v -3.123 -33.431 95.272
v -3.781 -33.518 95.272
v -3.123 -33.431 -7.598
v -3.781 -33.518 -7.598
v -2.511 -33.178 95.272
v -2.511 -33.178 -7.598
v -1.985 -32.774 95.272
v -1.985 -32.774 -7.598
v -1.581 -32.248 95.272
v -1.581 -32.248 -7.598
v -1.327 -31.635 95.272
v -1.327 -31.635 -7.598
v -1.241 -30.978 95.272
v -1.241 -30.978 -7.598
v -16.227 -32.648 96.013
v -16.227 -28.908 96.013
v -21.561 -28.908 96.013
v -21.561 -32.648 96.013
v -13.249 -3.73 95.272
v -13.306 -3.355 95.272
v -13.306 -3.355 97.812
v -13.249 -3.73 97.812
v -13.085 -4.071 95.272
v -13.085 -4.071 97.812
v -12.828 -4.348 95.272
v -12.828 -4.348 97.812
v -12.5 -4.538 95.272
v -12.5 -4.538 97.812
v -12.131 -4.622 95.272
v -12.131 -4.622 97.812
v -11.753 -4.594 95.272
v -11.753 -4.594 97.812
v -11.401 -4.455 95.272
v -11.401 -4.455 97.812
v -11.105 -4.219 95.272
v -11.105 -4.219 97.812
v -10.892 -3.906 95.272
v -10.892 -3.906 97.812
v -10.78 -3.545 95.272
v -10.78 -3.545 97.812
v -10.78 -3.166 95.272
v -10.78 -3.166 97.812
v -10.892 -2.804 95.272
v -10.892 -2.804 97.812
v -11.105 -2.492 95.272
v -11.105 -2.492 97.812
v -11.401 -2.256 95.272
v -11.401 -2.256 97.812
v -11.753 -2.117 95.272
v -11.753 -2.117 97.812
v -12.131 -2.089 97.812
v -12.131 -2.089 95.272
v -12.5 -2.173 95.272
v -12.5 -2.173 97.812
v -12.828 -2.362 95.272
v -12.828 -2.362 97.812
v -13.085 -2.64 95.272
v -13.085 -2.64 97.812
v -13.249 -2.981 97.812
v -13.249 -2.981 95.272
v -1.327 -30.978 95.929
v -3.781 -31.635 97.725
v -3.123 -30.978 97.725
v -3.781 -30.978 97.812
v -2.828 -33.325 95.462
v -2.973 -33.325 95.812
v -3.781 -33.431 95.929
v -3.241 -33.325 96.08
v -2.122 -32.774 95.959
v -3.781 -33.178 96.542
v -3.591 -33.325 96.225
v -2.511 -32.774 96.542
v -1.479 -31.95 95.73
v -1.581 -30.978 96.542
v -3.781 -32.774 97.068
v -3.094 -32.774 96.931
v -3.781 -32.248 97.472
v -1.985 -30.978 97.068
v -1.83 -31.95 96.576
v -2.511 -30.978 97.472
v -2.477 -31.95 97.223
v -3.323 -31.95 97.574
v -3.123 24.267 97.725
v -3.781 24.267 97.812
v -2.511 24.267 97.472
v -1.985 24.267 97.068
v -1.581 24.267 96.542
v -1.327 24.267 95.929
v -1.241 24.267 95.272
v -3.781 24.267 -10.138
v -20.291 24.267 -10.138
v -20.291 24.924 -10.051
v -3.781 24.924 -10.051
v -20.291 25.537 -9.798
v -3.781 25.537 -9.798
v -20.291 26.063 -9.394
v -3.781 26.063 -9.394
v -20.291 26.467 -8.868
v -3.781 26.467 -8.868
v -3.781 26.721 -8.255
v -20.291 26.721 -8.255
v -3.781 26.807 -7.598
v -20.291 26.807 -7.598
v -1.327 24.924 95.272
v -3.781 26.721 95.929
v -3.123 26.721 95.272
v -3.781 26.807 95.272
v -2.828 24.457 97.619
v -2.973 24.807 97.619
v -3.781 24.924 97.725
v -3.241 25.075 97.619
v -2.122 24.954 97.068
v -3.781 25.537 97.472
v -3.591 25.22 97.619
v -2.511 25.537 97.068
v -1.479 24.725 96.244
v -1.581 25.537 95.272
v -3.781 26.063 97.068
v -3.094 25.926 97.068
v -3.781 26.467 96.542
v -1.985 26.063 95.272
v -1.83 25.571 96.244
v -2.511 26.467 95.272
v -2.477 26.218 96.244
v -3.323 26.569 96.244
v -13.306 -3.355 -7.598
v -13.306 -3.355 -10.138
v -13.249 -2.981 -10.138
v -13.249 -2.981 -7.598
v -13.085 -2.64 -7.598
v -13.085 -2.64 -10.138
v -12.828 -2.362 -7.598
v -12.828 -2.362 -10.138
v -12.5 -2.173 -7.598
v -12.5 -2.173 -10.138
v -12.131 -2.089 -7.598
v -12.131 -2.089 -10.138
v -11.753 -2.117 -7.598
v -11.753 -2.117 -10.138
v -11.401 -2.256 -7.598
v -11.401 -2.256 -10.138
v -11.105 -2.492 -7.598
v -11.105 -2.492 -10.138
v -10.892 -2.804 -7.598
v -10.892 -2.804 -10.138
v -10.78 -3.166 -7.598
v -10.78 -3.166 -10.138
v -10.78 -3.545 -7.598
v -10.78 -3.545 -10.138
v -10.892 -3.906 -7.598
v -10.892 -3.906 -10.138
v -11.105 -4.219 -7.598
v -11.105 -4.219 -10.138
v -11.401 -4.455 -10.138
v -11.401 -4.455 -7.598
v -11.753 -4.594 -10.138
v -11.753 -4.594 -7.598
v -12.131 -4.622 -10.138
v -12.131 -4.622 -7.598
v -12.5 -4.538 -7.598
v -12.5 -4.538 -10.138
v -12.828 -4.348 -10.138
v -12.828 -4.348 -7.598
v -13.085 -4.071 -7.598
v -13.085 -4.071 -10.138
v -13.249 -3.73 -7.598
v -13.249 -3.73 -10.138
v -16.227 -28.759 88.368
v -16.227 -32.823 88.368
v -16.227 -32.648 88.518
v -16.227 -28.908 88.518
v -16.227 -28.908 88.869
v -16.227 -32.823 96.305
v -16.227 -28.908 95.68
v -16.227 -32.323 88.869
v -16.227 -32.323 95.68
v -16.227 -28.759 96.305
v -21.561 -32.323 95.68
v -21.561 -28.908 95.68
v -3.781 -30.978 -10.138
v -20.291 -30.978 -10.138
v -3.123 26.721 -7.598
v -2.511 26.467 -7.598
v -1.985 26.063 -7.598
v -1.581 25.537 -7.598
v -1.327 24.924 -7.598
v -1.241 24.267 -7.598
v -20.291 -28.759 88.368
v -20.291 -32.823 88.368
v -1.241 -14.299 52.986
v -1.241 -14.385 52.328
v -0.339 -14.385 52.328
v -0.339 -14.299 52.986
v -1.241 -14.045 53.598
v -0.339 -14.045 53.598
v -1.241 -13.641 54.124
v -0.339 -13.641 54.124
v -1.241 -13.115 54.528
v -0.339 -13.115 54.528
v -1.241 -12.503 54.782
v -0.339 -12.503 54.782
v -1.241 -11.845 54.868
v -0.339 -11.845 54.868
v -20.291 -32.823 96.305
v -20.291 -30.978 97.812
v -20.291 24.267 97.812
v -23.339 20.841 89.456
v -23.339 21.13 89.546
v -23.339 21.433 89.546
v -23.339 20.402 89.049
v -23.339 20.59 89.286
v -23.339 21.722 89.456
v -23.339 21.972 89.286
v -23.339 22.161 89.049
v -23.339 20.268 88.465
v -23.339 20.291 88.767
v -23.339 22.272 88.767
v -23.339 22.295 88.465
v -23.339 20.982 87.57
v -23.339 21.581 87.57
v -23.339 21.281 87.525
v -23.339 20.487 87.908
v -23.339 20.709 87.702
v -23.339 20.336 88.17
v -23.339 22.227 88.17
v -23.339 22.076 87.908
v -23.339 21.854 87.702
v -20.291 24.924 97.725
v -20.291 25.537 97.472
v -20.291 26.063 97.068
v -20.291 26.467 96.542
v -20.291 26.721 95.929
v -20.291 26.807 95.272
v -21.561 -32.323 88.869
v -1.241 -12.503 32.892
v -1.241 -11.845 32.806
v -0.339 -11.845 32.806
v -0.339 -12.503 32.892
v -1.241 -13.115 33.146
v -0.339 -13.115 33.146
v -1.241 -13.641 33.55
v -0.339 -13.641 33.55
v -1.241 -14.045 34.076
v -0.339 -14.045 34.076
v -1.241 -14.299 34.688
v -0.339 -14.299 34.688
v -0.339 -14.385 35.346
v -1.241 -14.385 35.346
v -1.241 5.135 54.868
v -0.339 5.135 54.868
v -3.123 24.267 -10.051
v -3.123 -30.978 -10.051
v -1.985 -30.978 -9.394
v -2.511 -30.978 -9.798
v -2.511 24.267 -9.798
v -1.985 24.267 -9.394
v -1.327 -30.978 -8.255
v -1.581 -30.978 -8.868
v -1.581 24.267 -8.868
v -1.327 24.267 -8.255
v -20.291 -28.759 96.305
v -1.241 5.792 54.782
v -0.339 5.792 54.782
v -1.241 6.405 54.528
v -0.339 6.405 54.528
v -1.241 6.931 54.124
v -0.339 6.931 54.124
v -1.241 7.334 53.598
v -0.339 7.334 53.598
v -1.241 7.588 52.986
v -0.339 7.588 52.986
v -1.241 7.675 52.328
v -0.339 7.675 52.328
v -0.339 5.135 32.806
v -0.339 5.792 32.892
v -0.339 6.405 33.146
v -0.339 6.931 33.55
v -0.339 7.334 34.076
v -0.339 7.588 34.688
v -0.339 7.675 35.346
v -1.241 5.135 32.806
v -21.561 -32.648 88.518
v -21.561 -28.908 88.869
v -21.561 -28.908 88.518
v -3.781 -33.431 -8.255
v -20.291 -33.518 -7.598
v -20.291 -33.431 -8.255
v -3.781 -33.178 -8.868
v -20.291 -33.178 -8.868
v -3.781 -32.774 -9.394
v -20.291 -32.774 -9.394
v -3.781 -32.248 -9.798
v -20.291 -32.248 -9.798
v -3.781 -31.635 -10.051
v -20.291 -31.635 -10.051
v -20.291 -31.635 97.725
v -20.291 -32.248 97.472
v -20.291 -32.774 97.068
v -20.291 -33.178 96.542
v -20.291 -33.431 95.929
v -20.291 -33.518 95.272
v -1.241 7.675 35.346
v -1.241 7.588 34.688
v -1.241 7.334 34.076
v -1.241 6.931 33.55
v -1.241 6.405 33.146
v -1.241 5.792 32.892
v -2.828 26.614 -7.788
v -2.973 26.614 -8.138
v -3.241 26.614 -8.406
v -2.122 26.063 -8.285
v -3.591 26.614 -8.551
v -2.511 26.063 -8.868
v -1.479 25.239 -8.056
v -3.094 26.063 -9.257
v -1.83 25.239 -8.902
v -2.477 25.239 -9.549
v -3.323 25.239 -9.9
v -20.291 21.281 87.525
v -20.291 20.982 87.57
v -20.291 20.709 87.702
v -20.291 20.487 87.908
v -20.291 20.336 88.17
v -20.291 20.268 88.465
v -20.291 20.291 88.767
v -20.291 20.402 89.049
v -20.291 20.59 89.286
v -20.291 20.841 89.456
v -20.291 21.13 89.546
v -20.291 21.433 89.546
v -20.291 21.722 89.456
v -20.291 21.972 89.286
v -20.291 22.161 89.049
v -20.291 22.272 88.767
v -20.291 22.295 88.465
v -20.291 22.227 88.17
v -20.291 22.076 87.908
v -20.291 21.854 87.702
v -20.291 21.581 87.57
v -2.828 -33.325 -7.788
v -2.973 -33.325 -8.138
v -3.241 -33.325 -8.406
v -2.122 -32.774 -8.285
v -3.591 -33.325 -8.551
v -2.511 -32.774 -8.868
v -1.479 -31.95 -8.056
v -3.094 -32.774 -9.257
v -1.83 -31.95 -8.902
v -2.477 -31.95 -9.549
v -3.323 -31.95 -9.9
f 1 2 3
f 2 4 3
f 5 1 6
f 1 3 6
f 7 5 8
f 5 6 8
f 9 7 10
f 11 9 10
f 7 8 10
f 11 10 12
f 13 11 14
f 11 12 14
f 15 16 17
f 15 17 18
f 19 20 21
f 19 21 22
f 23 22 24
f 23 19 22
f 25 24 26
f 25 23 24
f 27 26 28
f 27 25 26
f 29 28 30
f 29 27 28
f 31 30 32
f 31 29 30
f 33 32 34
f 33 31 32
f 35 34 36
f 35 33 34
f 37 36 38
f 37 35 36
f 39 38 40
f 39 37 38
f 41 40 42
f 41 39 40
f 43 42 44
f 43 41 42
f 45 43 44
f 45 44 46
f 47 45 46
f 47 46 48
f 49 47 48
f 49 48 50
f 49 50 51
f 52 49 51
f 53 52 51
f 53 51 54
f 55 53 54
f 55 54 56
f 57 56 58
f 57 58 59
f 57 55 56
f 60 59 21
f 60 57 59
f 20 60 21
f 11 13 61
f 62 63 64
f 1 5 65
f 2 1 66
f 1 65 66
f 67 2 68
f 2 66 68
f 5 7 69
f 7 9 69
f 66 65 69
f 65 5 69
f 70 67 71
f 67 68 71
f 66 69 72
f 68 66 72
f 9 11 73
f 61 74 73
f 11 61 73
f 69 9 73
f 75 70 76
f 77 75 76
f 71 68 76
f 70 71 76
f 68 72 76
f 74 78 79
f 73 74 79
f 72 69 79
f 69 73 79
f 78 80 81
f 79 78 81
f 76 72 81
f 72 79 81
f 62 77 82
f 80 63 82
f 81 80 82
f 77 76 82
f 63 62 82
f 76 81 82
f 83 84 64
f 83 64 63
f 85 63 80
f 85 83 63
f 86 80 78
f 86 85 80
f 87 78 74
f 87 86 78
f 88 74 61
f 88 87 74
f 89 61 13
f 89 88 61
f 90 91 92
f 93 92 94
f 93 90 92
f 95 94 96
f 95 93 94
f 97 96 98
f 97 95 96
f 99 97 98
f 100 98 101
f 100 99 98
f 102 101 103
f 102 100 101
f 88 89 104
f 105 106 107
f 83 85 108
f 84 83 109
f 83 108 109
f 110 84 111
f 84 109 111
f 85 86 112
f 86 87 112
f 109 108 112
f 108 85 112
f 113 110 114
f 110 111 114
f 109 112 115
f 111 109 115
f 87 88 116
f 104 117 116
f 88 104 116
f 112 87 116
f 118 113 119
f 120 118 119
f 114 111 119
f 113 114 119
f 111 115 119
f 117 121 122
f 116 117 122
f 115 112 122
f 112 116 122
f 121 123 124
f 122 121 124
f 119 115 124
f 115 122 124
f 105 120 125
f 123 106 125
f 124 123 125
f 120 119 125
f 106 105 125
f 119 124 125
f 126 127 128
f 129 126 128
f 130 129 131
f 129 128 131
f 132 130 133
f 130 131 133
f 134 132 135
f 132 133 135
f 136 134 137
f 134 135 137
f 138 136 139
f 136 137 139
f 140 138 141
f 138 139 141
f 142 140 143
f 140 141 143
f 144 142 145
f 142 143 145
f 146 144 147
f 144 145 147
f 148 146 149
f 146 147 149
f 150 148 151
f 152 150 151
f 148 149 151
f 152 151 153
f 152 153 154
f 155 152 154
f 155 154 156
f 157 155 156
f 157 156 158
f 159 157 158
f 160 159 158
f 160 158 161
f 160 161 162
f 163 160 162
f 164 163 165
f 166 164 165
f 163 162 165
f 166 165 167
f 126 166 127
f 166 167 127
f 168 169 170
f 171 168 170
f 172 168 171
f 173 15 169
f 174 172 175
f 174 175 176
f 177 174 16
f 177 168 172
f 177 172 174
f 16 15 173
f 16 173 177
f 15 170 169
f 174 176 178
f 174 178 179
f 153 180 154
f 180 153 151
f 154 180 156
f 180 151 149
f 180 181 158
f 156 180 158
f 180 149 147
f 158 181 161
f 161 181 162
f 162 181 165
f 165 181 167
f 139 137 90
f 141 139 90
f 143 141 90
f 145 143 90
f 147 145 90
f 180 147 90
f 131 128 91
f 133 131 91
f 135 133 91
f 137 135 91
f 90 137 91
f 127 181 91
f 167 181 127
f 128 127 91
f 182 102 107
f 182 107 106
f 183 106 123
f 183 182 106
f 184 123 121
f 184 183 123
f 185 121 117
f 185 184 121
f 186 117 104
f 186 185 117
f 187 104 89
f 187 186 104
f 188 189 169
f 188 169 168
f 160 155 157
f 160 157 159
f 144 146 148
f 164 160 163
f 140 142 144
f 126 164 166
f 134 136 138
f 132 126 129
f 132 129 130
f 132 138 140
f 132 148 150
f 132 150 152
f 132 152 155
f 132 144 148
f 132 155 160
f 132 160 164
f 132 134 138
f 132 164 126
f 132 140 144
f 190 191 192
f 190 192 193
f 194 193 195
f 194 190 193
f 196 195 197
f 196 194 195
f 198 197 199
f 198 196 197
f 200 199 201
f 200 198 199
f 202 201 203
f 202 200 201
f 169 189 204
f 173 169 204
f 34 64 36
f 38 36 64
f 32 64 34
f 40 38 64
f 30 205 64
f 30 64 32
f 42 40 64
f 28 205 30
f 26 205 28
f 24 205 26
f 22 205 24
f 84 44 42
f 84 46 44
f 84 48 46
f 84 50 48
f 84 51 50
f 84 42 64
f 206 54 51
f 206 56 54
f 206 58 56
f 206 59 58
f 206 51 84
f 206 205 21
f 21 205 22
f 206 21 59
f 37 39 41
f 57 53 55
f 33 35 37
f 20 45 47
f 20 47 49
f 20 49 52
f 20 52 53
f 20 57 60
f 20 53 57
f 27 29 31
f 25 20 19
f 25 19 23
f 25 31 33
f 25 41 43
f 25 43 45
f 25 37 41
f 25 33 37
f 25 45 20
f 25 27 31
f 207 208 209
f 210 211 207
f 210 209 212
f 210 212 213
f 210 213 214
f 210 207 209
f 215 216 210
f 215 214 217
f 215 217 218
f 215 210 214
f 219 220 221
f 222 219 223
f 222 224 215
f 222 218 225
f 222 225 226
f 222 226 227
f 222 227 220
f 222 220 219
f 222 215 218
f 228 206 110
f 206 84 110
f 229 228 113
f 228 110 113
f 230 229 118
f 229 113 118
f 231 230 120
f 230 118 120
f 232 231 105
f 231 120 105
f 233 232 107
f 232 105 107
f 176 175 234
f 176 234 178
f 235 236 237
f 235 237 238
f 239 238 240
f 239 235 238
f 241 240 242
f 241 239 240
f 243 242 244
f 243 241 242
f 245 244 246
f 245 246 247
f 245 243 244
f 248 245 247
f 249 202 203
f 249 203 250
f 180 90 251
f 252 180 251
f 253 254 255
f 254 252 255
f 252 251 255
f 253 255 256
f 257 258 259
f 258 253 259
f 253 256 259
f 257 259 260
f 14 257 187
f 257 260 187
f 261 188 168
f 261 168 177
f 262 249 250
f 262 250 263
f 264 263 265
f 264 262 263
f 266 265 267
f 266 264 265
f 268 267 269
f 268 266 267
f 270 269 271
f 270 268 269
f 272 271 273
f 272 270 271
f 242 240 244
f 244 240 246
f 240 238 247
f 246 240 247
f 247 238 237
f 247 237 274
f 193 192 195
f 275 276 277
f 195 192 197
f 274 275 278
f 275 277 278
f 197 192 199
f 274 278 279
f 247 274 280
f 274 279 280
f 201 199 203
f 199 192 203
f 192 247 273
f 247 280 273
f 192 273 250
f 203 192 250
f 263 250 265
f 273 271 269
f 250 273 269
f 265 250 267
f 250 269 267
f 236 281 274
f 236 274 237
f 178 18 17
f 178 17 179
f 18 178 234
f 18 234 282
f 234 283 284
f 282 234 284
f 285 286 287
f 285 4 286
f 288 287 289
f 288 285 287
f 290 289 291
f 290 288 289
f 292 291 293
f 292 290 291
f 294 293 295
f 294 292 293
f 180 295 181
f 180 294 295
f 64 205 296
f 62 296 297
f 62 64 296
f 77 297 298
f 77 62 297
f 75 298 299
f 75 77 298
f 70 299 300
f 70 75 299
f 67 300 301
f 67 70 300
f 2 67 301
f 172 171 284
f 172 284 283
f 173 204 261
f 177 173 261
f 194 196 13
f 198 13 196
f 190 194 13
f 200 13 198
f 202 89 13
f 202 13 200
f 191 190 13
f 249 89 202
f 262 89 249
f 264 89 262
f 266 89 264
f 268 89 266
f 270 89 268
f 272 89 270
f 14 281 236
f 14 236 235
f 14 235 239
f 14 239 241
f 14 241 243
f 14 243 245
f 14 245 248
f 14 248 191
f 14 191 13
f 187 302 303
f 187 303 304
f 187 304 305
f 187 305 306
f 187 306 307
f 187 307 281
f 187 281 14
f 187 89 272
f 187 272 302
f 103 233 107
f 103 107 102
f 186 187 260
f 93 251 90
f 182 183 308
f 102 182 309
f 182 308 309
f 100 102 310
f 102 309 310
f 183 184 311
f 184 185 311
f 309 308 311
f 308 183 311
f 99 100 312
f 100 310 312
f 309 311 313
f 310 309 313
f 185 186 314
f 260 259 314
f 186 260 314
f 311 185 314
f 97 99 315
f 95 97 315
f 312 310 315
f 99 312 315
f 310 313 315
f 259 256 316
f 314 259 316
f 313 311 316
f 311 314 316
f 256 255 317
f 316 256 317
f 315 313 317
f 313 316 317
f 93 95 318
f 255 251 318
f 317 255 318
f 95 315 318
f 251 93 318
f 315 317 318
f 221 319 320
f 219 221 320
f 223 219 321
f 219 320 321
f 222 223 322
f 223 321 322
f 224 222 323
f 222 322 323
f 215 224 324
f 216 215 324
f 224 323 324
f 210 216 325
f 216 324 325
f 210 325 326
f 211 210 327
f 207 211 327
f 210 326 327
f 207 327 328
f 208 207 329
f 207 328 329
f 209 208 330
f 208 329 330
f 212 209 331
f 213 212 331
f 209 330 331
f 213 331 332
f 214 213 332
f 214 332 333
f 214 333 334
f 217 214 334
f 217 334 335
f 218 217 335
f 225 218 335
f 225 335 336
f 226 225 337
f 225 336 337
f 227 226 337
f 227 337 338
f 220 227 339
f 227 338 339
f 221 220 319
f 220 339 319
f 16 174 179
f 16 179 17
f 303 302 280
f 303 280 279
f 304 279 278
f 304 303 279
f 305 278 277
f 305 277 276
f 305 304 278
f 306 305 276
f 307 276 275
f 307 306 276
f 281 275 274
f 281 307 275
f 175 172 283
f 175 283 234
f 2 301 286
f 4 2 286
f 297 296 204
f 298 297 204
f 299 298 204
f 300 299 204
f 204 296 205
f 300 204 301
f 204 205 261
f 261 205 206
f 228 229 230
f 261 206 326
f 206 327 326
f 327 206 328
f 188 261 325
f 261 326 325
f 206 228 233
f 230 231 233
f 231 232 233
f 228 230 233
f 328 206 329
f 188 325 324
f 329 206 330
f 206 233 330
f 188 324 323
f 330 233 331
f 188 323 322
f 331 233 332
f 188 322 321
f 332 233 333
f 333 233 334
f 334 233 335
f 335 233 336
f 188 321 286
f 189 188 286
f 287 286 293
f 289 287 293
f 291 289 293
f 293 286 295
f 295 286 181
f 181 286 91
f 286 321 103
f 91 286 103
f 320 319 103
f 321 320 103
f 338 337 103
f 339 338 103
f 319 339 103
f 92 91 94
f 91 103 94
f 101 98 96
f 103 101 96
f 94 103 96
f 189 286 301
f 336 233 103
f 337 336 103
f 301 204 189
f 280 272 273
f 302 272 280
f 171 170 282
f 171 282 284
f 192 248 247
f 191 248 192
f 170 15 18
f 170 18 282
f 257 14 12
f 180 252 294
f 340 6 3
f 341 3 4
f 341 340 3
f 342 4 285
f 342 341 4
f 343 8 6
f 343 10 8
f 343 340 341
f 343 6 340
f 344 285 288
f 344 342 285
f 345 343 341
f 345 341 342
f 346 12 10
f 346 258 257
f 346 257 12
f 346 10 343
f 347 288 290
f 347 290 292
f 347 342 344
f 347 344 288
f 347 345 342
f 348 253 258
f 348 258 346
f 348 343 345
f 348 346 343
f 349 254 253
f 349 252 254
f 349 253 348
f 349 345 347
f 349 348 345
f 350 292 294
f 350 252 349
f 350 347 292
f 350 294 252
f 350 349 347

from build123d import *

# Parameters (mm, degrees)
SKETCH1_W           = 107.95
SKETCH1_H           = 60.325
BOSS_EXTRUDE1_DEPTH = 19.05
FILLET1_R           = 2.54
SKETCH5_R           = 1.27
CUT_EXTRUDE2_DEPTH  = 2.54
CUT_EXTRUDE3_START  = -2.54
SKETCH6_R           = 1.27
CUT_EXTRUDE3_DEPTH  = 2.54
BOSS_EXTRUDE3_DEPTH = 0.9017
SKETCH8_R           = 1.016
BOSS_EXTRUDE4_DEPTH = 3.048
SKETCH9_W           = 7.9375
SKETCH9_H           = 4.064
CUT_EXTRUDE4_DEPTH  = 4.064
BOSS_EXTRUDE5_DEPTH = 5.334


with BuildPart() as part:
    # Sketch1 → Boss-Extrude1 (new body)
    with BuildSketch(Plane(origin=(-20.290873615, 0, 0), x_dir=(0, 0, -1), z_dir=(1, 0, 0))):
        with Locations((-43.836998095, -3.355404983)):
            Rectangle(SKETCH1_W, SKETCH1_H)
    extrude(amount=BOSS_EXTRUDE1_DEPTH)

    # Fillet1
    fillet1_edges = [part.edges().sort_by_distance(p)[0] for p in [
        (-1.240873615, -3.355404983, -10.138001905),
        (-1.240873615, 26.807095017, 43.836998095),
        (-1.240873615, -3.355404983, 97.811998095),
        (-1.240873615, -33.517904983, 43.836998095),
        (-10.765873615, 26.807095017, 97.811998095),
        (-10.765873615, 26.807095017, -10.138001905),
        (-10.765873615, -33.517904983, -10.138001905),
        (-10.765873615, -33.517904983, 97.811998095),
    ]]
    fillet(fillet1_edges, radius=FILLET1_R)

    # Sketch5 → Cut-Extrude2 (cut)
    with BuildSketch(Plane(origin=(0, 0, -10.138001905), x_dir=(-1, 0, 0), z_dir=(0, 0, -1))):
        with Locations((12.035873615, -3.355404983)):
            Circle(SKETCH5_R)
    extrude(amount=-CUT_EXTRUDE2_DEPTH, mode=Mode.SUBTRACT)

    # Sketch6 → Cut-Extrude3 (cut)
    with BuildSketch(Plane.XY.offset(97.811998095).offset(CUT_EXTRUDE3_START)):
        with Locations(Location((-12.035873615, -3.355404983, 0), (0, 0, 180))):
            Circle(SKETCH6_R)
    extrude(amount=CUT_EXTRUDE3_DEPTH, mode=Mode.SUBTRACT)

    # Sketch7 → Boss-Extrude3 (add)
    with BuildSketch(Plane(origin=(-1.240873615, 0, 0), x_dir=(0, 0, -1), z_dir=(1, 0, 0))):
        with BuildLine():
            Line((-52.328218095, 7.674545017), (-35.345778095, 7.674545017))
            ThreePointArc((-35.345778095, 7.674545017), (-33.549726871, 6.930596241), (-32.805778095, 5.134545017))
            Line((-32.805778095, 5.134545017), (-32.805778095, -11.845354983))
            ThreePointArc((-32.805778095, -11.845354983), (-33.549726871, -13.641406207), (-35.345778095, -14.385354983))
            Line((-35.345778095, -14.385354983), (-52.328218095, -14.385354983))
            ThreePointArc((-52.328218095, -14.385354983), (-54.124269319, -13.641406207), (-54.868218095, -11.845354983))
            Line((-54.868218095, -11.845354983), (-54.868218095, 5.134545017))
            ThreePointArc((-54.868218095, 5.134545017), (-54.124269319, 6.930596241), (-52.328218095, 7.674545017))
        make_face()
    extrude(amount=BOSS_EXTRUDE3_DEPTH)

    # Sketch8 → Boss-Extrude4 (add)
    with BuildSketch(Plane.ZY.offset(20.290873615)):
        with Locations(Location((88.540998095, 21.281395003, 0), (0, 0, 180))):
            Circle(SKETCH8_R)
    extrude(amount=BOSS_EXTRUDE4_DEPTH)

    # Sketch9 → Cut-Extrude4 (cut)
    with BuildSketch(Plane.ZY.offset(20.290873615)):
        with Locations((92.336317085, -30.791056829)):
            Rectangle(SKETCH9_W, SKETCH9_H)
    extrude(amount=-CUT_EXTRUDE4_DEPTH, mode=Mode.SUBTRACT)

    # Sketch10 → Boss-Extrude5 (add)
    with BuildSketch(Plane.ZY.offset(16.226873615)):
        Polygon((88.868929932, -28.90840101), (88.868929932, -32.323313533), (95.680387965, -32.323313533), (95.680387965, -28.90840101), (96.013379651, -28.90840101), (96.013379651, -32.648312217), (88.518168835, -32.648312217), (88.518168835, -28.90840101), align=None)
    extrude(amount=BOSS_EXTRUDE5_DEPTH)


solid = part.part
